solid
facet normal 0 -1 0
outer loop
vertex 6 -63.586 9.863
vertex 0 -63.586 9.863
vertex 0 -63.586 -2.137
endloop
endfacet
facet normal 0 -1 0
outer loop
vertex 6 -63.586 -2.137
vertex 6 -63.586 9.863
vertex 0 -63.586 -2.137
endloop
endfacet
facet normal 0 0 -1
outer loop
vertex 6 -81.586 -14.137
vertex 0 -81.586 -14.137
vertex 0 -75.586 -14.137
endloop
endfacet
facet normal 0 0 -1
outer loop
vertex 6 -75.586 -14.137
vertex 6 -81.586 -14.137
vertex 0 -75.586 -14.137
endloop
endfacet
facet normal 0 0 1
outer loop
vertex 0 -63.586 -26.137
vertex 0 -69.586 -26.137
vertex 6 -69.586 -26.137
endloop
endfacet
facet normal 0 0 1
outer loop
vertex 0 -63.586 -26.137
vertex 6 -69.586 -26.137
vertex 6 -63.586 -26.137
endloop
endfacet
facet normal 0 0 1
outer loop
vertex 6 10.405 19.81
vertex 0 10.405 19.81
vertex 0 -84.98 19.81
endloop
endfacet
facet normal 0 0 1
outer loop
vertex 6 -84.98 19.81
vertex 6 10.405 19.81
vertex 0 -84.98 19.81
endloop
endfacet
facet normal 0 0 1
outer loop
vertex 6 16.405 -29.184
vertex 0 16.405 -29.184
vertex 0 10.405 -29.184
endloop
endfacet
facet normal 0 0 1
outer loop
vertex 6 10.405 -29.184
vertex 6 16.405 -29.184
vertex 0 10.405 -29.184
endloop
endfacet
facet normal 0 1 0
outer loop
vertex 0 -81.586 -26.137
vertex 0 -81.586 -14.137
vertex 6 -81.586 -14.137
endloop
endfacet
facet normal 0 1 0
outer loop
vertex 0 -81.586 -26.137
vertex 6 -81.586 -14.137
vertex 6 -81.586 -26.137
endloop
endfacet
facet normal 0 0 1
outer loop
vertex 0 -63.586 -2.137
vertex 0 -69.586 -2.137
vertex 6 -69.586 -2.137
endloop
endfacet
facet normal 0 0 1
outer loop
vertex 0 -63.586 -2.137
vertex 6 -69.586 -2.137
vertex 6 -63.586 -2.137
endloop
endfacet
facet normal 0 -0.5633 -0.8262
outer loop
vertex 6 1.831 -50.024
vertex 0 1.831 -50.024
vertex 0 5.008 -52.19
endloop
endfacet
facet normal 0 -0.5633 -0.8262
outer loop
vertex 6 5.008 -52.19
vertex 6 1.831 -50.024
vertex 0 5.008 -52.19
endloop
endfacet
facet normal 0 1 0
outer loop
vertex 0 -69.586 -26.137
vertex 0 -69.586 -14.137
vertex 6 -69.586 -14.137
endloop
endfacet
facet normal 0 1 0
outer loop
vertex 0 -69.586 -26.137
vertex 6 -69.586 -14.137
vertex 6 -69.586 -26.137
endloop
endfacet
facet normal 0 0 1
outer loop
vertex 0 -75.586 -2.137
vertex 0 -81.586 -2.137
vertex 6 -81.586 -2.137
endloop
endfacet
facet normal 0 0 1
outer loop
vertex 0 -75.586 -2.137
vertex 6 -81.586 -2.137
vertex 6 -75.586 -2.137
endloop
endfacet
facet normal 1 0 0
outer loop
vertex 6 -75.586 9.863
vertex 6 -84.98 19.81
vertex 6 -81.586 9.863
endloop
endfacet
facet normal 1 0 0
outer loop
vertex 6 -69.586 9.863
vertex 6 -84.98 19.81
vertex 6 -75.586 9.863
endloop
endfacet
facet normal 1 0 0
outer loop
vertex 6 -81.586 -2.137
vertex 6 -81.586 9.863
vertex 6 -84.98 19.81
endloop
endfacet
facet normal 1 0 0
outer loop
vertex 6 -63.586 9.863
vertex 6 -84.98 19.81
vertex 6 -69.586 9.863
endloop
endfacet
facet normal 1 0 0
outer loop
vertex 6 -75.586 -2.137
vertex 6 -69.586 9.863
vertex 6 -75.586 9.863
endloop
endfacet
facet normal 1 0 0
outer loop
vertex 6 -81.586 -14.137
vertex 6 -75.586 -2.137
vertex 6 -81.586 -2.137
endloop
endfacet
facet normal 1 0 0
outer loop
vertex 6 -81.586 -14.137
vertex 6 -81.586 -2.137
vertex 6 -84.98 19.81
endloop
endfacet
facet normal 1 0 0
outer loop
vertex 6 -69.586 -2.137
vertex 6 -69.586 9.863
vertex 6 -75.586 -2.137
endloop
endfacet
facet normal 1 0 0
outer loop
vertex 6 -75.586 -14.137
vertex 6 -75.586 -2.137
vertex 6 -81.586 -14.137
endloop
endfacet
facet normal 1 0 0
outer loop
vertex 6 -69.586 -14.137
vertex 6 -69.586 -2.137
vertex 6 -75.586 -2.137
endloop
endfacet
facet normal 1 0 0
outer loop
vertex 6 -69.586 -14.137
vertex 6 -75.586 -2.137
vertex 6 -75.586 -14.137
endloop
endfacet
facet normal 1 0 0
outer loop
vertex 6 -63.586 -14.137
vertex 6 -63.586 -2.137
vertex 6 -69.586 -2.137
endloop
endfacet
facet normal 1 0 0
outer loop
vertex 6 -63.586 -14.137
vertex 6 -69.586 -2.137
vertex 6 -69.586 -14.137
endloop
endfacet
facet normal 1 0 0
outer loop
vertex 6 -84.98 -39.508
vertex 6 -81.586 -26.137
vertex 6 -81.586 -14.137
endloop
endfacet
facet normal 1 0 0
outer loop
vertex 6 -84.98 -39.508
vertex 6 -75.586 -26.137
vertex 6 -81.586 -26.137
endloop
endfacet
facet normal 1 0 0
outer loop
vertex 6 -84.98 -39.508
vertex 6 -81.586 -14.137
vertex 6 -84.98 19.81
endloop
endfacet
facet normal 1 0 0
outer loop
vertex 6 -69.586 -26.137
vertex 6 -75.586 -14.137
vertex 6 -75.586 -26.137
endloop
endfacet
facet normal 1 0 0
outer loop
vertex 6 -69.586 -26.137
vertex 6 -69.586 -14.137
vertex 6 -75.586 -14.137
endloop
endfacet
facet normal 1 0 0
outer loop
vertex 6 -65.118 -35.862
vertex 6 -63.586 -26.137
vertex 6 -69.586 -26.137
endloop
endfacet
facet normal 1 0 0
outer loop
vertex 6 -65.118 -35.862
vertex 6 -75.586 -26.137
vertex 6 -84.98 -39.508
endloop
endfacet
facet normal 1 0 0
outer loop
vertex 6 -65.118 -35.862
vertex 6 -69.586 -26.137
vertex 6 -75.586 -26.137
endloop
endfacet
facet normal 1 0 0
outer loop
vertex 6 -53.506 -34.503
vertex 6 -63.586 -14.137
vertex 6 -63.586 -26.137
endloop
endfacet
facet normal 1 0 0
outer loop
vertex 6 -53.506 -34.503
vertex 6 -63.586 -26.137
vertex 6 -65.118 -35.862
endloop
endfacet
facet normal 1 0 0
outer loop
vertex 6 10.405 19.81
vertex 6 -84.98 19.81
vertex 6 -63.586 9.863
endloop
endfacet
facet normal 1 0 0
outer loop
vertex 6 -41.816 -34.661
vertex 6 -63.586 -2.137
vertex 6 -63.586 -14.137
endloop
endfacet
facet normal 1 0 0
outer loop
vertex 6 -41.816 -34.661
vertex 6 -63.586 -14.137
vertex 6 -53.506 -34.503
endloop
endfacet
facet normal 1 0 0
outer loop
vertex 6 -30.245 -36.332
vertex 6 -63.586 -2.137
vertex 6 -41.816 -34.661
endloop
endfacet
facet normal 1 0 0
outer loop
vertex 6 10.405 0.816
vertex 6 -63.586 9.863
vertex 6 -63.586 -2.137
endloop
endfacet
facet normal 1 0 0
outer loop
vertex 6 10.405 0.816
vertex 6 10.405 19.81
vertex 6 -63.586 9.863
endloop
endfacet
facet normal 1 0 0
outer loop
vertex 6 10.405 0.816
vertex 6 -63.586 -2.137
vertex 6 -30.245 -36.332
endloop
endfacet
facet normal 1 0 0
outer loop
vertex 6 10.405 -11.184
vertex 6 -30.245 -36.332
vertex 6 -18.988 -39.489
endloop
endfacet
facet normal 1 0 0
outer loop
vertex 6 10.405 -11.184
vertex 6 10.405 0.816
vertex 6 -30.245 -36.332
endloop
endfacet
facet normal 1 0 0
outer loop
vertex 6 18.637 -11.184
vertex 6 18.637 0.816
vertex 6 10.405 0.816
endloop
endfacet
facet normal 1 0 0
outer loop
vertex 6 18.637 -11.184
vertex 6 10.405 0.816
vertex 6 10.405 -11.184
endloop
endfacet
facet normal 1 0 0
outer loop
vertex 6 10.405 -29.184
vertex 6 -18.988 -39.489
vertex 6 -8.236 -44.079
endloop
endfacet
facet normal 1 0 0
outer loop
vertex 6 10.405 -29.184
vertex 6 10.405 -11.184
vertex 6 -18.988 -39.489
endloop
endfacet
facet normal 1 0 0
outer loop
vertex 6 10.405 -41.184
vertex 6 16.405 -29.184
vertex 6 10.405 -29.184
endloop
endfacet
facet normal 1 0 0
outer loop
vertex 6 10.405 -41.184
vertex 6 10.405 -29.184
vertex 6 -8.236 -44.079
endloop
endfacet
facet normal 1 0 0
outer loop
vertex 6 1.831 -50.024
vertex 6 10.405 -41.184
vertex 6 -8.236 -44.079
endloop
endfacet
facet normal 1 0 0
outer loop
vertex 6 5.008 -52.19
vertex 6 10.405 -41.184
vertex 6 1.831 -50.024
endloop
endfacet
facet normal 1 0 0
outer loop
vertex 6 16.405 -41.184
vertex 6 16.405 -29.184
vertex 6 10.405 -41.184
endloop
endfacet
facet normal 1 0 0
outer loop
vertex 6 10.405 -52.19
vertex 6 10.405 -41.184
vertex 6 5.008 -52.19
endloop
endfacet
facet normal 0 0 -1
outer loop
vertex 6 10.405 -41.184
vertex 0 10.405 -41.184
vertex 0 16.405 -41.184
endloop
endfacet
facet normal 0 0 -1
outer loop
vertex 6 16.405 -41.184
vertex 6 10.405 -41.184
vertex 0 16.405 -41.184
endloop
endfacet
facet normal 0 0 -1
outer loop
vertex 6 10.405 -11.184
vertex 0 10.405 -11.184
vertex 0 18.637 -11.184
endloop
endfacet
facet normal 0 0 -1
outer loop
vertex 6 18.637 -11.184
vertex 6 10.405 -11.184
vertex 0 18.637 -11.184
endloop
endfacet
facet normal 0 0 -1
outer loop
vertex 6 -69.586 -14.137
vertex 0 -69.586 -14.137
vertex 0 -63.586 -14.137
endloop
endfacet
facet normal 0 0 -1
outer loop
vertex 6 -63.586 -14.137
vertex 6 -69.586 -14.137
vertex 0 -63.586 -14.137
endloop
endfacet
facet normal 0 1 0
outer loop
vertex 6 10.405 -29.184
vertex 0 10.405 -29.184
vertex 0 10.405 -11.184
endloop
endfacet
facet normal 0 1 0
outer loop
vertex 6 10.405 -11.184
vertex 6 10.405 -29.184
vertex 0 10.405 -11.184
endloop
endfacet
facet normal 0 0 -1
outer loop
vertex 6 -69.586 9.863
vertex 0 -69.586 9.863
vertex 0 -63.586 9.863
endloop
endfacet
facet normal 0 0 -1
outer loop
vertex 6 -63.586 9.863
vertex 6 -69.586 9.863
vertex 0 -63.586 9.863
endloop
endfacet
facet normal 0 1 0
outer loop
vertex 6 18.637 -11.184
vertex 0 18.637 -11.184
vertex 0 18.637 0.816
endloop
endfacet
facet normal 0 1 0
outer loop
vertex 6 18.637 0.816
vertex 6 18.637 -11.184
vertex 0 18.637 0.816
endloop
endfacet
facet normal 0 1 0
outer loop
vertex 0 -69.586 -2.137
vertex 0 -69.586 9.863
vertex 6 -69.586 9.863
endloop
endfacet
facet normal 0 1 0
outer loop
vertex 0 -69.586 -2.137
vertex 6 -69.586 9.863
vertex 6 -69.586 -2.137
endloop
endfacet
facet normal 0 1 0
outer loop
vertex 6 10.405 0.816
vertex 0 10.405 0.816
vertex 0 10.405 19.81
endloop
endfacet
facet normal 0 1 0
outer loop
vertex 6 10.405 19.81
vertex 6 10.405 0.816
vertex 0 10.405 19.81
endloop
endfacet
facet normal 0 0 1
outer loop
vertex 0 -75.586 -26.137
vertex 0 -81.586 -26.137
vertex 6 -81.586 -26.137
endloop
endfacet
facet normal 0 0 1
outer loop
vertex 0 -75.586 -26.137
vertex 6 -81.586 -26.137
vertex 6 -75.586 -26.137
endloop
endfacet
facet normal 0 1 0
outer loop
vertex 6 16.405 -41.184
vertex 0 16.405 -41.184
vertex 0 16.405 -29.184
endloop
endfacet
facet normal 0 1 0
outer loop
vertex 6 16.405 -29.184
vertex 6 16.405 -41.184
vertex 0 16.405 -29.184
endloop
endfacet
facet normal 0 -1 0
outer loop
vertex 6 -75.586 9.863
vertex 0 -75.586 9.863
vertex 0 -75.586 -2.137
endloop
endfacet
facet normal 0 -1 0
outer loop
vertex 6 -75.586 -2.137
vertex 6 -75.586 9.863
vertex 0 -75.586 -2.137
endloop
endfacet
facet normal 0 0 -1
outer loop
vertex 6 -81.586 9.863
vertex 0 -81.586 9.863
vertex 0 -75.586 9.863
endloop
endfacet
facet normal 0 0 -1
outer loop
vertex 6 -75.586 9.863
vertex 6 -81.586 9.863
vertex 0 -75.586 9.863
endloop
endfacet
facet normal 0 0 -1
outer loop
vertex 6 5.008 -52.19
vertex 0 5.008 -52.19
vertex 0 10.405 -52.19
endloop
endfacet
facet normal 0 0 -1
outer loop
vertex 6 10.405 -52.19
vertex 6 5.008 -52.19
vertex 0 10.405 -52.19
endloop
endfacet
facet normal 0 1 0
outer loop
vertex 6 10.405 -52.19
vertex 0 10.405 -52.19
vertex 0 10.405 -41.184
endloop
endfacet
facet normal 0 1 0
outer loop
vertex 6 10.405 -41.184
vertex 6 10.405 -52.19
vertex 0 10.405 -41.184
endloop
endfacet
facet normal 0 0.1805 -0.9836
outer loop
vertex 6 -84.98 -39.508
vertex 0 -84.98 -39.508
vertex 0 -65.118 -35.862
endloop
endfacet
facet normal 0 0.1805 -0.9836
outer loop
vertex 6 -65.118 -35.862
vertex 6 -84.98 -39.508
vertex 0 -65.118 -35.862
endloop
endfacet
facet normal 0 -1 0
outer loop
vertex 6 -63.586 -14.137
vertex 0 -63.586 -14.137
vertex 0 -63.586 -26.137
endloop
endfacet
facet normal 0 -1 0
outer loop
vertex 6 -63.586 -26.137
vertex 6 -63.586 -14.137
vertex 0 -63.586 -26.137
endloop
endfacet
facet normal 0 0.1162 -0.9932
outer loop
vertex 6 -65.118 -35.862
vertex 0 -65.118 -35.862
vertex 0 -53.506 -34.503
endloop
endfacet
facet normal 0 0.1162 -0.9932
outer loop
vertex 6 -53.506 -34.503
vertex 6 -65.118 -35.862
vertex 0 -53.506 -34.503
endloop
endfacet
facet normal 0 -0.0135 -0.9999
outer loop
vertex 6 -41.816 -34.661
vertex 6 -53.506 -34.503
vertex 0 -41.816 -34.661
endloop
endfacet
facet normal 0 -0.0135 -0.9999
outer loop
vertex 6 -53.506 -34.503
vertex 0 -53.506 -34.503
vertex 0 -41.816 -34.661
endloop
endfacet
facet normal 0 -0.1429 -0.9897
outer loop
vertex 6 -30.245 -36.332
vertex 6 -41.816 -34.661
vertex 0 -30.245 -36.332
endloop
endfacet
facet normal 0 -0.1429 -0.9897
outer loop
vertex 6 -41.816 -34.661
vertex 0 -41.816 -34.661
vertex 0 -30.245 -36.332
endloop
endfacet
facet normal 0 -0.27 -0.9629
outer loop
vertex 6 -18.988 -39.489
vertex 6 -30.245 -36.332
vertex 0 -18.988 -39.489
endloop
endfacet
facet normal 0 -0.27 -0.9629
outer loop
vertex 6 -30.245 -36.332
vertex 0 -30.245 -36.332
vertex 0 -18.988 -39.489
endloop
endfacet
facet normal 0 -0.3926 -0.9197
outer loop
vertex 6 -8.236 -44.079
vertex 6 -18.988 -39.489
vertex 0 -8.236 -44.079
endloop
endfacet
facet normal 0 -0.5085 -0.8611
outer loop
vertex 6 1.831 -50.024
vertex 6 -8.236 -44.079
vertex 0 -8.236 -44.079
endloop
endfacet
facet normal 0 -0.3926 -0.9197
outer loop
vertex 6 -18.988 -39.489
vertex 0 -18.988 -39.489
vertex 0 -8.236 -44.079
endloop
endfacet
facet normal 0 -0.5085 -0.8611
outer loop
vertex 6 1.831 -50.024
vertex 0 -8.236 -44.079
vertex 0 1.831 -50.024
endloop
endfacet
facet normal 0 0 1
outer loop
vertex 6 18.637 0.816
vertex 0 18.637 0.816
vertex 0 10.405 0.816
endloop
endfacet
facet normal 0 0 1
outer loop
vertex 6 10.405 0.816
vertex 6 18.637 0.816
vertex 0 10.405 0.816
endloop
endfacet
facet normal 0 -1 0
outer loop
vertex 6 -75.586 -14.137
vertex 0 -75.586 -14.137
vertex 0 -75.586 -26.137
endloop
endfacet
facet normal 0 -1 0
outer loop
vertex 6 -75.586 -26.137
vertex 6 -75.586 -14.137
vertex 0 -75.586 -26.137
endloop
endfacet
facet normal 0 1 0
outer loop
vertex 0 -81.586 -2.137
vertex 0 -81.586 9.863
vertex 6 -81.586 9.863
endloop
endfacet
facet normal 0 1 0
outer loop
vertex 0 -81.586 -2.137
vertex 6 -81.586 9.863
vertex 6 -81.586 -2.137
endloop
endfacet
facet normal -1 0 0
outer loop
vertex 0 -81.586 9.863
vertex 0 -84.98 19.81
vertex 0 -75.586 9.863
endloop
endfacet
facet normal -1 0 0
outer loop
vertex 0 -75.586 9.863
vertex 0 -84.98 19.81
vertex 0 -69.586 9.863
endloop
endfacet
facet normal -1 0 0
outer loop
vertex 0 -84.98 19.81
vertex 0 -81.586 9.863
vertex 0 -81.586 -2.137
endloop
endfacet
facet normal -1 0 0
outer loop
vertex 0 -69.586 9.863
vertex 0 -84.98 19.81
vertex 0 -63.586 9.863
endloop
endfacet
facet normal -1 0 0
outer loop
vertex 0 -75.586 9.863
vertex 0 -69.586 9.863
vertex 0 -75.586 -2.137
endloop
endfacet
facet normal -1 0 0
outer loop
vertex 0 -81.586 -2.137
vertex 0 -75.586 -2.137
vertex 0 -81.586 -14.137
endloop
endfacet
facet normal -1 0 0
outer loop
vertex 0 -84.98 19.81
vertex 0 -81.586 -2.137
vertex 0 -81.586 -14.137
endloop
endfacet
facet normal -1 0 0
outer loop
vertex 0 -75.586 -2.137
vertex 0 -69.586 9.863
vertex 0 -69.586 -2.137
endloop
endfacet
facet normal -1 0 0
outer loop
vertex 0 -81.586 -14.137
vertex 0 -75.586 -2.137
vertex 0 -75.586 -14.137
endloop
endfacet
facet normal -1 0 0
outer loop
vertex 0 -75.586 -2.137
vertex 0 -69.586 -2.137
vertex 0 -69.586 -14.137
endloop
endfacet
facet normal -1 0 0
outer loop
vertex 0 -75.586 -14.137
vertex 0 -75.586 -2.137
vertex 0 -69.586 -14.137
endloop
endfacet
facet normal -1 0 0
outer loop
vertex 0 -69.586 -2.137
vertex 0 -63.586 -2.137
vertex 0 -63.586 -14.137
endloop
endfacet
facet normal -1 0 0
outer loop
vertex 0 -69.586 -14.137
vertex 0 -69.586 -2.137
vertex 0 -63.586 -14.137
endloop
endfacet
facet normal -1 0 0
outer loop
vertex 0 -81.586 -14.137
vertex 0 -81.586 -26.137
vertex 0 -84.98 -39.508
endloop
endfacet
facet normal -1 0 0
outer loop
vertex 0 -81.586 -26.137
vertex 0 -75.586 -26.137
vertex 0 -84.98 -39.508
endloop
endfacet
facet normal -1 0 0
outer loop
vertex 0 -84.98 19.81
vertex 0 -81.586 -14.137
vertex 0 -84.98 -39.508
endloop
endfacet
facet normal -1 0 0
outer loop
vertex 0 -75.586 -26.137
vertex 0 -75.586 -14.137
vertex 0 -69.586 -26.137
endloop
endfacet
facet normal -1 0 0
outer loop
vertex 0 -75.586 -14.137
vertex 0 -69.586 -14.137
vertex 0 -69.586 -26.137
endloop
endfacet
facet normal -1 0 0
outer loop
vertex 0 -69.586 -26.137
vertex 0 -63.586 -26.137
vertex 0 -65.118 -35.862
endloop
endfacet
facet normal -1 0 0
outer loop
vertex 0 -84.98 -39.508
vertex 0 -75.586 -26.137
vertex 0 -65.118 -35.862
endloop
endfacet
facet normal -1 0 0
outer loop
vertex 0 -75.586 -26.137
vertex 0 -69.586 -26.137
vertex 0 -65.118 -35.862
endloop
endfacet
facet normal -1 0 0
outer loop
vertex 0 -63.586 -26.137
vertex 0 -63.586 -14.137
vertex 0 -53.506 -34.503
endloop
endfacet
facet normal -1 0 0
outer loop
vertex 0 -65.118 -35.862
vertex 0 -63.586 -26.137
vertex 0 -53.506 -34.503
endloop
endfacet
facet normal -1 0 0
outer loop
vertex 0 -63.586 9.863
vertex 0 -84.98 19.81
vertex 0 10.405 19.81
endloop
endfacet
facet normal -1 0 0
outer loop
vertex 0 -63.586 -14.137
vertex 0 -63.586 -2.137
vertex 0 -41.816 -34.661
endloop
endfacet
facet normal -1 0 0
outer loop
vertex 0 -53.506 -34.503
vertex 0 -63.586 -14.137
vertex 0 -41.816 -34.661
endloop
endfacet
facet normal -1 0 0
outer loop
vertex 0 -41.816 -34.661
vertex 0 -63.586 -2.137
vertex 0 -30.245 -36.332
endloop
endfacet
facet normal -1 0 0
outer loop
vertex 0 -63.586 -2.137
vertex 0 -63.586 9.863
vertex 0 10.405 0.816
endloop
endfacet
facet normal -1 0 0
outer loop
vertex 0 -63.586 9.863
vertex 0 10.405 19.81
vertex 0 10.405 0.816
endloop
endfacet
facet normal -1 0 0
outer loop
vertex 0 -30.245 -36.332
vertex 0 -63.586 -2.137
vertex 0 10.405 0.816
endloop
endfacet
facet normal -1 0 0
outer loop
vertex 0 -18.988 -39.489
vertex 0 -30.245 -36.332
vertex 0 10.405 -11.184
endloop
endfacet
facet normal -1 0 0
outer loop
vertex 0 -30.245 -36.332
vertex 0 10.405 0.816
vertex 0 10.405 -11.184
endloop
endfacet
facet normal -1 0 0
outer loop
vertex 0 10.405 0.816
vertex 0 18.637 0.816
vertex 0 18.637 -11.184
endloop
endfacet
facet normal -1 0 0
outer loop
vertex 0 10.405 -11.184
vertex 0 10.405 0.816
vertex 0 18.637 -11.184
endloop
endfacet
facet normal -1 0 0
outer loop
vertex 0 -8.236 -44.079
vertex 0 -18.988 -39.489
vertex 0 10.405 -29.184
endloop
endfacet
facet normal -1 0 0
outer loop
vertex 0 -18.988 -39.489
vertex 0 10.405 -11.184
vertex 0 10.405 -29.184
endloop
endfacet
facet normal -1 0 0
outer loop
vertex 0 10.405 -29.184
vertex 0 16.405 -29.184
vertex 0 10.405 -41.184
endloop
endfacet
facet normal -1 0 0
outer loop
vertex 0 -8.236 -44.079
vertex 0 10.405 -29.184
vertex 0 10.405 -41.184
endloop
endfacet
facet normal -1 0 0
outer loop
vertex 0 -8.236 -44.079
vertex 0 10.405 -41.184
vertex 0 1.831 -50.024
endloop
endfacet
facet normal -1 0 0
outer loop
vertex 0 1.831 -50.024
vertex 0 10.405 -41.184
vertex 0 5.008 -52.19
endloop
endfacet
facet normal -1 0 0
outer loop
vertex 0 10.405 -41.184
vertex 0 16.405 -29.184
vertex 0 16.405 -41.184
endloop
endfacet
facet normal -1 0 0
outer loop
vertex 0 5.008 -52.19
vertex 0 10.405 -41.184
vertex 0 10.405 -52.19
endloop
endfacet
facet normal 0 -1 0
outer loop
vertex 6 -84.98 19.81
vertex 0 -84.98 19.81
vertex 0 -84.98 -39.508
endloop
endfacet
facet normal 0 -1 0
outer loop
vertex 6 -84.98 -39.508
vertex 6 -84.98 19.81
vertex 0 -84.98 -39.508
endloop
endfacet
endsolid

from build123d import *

# Parameters (mm, degrees)
SKETCH1_W           = 12
SKETCH1_H           = 6
BOSS_EXTRUDE1_DEPTH = 6


with BuildPart() as part:
    # Sketch1 → Boss-Extrude1 (new body)
    with BuildSketch(Plane(origin=(0, 0, 0), x_dir=(0, 0, -1), z_dir=(1, 0, 0))):
        with BuildLine():
            Line((-19.809776263, 10.405108849), (-19.809776263, -84.98038082))
            Line((-19.809776263, -84.98038082), (39.507973257, -84.98038082))
            Line((39.507973257, -84.98038082), (35.862319142, -65.117665917))
            ThreePointArc((35.862319142, -65.117665917), (36.331936953, -30.24496444), (50.023720259, 1.830897499))
            Line((50.023720259, 1.830897499), (52.190223737, 5.008360642))
            Line((52.190223737, 5.008360642), (52.190223737, 10.405108849))
            Line((52.190223737, 10.405108849), (41.184188047, 10.405108849))
            Line((41.184188047, 10.405108849), (41.184188047, 16.405108849))
            Line((41.184188047, 16.405108849), (29.184188047, 16.405108849))
            Line((29.184188047, 16.405108849), (29.184188047, 10.405108849))
            Line((29.184188047, 10.405108849), (11.184188047, 10.405108849))
            Line((11.184188047, 10.405108849), (11.184188047, 18.63698455))
            Line((11.184188047, 18.63698455), (-0.815811953, 18.63698455))
            Line((-0.815811953, 18.63698455), (-0.815811953, 10.405108849))
            Line((-0.815811953, 10.405108849), (-19.809776263, 10.405108849))
        make_face()
        with Locations((-3.863115861, -78.586137139)):
            Rectangle(SKETCH1_W, SKETCH1_H, mode=Mode.SUBTRACT)
        with Locations((20.136884139, -78.586137139)):
            Rectangle(SKETCH1_W, SKETCH1_H, mode=Mode.SUBTRACT)
        with Locations((-3.863115861, -66.586137139)):
            Rectangle(SKETCH1_W, SKETCH1_H, mode=Mode.SUBTRACT)
        with Locations((20.136884139, -66.586137139)):
            Rectangle(SKETCH1_W, SKETCH1_H, mode=Mode.SUBTRACT)
    extrude(amount=BOSS_EXTRUDE1_DEPTH)


solid = part.part
